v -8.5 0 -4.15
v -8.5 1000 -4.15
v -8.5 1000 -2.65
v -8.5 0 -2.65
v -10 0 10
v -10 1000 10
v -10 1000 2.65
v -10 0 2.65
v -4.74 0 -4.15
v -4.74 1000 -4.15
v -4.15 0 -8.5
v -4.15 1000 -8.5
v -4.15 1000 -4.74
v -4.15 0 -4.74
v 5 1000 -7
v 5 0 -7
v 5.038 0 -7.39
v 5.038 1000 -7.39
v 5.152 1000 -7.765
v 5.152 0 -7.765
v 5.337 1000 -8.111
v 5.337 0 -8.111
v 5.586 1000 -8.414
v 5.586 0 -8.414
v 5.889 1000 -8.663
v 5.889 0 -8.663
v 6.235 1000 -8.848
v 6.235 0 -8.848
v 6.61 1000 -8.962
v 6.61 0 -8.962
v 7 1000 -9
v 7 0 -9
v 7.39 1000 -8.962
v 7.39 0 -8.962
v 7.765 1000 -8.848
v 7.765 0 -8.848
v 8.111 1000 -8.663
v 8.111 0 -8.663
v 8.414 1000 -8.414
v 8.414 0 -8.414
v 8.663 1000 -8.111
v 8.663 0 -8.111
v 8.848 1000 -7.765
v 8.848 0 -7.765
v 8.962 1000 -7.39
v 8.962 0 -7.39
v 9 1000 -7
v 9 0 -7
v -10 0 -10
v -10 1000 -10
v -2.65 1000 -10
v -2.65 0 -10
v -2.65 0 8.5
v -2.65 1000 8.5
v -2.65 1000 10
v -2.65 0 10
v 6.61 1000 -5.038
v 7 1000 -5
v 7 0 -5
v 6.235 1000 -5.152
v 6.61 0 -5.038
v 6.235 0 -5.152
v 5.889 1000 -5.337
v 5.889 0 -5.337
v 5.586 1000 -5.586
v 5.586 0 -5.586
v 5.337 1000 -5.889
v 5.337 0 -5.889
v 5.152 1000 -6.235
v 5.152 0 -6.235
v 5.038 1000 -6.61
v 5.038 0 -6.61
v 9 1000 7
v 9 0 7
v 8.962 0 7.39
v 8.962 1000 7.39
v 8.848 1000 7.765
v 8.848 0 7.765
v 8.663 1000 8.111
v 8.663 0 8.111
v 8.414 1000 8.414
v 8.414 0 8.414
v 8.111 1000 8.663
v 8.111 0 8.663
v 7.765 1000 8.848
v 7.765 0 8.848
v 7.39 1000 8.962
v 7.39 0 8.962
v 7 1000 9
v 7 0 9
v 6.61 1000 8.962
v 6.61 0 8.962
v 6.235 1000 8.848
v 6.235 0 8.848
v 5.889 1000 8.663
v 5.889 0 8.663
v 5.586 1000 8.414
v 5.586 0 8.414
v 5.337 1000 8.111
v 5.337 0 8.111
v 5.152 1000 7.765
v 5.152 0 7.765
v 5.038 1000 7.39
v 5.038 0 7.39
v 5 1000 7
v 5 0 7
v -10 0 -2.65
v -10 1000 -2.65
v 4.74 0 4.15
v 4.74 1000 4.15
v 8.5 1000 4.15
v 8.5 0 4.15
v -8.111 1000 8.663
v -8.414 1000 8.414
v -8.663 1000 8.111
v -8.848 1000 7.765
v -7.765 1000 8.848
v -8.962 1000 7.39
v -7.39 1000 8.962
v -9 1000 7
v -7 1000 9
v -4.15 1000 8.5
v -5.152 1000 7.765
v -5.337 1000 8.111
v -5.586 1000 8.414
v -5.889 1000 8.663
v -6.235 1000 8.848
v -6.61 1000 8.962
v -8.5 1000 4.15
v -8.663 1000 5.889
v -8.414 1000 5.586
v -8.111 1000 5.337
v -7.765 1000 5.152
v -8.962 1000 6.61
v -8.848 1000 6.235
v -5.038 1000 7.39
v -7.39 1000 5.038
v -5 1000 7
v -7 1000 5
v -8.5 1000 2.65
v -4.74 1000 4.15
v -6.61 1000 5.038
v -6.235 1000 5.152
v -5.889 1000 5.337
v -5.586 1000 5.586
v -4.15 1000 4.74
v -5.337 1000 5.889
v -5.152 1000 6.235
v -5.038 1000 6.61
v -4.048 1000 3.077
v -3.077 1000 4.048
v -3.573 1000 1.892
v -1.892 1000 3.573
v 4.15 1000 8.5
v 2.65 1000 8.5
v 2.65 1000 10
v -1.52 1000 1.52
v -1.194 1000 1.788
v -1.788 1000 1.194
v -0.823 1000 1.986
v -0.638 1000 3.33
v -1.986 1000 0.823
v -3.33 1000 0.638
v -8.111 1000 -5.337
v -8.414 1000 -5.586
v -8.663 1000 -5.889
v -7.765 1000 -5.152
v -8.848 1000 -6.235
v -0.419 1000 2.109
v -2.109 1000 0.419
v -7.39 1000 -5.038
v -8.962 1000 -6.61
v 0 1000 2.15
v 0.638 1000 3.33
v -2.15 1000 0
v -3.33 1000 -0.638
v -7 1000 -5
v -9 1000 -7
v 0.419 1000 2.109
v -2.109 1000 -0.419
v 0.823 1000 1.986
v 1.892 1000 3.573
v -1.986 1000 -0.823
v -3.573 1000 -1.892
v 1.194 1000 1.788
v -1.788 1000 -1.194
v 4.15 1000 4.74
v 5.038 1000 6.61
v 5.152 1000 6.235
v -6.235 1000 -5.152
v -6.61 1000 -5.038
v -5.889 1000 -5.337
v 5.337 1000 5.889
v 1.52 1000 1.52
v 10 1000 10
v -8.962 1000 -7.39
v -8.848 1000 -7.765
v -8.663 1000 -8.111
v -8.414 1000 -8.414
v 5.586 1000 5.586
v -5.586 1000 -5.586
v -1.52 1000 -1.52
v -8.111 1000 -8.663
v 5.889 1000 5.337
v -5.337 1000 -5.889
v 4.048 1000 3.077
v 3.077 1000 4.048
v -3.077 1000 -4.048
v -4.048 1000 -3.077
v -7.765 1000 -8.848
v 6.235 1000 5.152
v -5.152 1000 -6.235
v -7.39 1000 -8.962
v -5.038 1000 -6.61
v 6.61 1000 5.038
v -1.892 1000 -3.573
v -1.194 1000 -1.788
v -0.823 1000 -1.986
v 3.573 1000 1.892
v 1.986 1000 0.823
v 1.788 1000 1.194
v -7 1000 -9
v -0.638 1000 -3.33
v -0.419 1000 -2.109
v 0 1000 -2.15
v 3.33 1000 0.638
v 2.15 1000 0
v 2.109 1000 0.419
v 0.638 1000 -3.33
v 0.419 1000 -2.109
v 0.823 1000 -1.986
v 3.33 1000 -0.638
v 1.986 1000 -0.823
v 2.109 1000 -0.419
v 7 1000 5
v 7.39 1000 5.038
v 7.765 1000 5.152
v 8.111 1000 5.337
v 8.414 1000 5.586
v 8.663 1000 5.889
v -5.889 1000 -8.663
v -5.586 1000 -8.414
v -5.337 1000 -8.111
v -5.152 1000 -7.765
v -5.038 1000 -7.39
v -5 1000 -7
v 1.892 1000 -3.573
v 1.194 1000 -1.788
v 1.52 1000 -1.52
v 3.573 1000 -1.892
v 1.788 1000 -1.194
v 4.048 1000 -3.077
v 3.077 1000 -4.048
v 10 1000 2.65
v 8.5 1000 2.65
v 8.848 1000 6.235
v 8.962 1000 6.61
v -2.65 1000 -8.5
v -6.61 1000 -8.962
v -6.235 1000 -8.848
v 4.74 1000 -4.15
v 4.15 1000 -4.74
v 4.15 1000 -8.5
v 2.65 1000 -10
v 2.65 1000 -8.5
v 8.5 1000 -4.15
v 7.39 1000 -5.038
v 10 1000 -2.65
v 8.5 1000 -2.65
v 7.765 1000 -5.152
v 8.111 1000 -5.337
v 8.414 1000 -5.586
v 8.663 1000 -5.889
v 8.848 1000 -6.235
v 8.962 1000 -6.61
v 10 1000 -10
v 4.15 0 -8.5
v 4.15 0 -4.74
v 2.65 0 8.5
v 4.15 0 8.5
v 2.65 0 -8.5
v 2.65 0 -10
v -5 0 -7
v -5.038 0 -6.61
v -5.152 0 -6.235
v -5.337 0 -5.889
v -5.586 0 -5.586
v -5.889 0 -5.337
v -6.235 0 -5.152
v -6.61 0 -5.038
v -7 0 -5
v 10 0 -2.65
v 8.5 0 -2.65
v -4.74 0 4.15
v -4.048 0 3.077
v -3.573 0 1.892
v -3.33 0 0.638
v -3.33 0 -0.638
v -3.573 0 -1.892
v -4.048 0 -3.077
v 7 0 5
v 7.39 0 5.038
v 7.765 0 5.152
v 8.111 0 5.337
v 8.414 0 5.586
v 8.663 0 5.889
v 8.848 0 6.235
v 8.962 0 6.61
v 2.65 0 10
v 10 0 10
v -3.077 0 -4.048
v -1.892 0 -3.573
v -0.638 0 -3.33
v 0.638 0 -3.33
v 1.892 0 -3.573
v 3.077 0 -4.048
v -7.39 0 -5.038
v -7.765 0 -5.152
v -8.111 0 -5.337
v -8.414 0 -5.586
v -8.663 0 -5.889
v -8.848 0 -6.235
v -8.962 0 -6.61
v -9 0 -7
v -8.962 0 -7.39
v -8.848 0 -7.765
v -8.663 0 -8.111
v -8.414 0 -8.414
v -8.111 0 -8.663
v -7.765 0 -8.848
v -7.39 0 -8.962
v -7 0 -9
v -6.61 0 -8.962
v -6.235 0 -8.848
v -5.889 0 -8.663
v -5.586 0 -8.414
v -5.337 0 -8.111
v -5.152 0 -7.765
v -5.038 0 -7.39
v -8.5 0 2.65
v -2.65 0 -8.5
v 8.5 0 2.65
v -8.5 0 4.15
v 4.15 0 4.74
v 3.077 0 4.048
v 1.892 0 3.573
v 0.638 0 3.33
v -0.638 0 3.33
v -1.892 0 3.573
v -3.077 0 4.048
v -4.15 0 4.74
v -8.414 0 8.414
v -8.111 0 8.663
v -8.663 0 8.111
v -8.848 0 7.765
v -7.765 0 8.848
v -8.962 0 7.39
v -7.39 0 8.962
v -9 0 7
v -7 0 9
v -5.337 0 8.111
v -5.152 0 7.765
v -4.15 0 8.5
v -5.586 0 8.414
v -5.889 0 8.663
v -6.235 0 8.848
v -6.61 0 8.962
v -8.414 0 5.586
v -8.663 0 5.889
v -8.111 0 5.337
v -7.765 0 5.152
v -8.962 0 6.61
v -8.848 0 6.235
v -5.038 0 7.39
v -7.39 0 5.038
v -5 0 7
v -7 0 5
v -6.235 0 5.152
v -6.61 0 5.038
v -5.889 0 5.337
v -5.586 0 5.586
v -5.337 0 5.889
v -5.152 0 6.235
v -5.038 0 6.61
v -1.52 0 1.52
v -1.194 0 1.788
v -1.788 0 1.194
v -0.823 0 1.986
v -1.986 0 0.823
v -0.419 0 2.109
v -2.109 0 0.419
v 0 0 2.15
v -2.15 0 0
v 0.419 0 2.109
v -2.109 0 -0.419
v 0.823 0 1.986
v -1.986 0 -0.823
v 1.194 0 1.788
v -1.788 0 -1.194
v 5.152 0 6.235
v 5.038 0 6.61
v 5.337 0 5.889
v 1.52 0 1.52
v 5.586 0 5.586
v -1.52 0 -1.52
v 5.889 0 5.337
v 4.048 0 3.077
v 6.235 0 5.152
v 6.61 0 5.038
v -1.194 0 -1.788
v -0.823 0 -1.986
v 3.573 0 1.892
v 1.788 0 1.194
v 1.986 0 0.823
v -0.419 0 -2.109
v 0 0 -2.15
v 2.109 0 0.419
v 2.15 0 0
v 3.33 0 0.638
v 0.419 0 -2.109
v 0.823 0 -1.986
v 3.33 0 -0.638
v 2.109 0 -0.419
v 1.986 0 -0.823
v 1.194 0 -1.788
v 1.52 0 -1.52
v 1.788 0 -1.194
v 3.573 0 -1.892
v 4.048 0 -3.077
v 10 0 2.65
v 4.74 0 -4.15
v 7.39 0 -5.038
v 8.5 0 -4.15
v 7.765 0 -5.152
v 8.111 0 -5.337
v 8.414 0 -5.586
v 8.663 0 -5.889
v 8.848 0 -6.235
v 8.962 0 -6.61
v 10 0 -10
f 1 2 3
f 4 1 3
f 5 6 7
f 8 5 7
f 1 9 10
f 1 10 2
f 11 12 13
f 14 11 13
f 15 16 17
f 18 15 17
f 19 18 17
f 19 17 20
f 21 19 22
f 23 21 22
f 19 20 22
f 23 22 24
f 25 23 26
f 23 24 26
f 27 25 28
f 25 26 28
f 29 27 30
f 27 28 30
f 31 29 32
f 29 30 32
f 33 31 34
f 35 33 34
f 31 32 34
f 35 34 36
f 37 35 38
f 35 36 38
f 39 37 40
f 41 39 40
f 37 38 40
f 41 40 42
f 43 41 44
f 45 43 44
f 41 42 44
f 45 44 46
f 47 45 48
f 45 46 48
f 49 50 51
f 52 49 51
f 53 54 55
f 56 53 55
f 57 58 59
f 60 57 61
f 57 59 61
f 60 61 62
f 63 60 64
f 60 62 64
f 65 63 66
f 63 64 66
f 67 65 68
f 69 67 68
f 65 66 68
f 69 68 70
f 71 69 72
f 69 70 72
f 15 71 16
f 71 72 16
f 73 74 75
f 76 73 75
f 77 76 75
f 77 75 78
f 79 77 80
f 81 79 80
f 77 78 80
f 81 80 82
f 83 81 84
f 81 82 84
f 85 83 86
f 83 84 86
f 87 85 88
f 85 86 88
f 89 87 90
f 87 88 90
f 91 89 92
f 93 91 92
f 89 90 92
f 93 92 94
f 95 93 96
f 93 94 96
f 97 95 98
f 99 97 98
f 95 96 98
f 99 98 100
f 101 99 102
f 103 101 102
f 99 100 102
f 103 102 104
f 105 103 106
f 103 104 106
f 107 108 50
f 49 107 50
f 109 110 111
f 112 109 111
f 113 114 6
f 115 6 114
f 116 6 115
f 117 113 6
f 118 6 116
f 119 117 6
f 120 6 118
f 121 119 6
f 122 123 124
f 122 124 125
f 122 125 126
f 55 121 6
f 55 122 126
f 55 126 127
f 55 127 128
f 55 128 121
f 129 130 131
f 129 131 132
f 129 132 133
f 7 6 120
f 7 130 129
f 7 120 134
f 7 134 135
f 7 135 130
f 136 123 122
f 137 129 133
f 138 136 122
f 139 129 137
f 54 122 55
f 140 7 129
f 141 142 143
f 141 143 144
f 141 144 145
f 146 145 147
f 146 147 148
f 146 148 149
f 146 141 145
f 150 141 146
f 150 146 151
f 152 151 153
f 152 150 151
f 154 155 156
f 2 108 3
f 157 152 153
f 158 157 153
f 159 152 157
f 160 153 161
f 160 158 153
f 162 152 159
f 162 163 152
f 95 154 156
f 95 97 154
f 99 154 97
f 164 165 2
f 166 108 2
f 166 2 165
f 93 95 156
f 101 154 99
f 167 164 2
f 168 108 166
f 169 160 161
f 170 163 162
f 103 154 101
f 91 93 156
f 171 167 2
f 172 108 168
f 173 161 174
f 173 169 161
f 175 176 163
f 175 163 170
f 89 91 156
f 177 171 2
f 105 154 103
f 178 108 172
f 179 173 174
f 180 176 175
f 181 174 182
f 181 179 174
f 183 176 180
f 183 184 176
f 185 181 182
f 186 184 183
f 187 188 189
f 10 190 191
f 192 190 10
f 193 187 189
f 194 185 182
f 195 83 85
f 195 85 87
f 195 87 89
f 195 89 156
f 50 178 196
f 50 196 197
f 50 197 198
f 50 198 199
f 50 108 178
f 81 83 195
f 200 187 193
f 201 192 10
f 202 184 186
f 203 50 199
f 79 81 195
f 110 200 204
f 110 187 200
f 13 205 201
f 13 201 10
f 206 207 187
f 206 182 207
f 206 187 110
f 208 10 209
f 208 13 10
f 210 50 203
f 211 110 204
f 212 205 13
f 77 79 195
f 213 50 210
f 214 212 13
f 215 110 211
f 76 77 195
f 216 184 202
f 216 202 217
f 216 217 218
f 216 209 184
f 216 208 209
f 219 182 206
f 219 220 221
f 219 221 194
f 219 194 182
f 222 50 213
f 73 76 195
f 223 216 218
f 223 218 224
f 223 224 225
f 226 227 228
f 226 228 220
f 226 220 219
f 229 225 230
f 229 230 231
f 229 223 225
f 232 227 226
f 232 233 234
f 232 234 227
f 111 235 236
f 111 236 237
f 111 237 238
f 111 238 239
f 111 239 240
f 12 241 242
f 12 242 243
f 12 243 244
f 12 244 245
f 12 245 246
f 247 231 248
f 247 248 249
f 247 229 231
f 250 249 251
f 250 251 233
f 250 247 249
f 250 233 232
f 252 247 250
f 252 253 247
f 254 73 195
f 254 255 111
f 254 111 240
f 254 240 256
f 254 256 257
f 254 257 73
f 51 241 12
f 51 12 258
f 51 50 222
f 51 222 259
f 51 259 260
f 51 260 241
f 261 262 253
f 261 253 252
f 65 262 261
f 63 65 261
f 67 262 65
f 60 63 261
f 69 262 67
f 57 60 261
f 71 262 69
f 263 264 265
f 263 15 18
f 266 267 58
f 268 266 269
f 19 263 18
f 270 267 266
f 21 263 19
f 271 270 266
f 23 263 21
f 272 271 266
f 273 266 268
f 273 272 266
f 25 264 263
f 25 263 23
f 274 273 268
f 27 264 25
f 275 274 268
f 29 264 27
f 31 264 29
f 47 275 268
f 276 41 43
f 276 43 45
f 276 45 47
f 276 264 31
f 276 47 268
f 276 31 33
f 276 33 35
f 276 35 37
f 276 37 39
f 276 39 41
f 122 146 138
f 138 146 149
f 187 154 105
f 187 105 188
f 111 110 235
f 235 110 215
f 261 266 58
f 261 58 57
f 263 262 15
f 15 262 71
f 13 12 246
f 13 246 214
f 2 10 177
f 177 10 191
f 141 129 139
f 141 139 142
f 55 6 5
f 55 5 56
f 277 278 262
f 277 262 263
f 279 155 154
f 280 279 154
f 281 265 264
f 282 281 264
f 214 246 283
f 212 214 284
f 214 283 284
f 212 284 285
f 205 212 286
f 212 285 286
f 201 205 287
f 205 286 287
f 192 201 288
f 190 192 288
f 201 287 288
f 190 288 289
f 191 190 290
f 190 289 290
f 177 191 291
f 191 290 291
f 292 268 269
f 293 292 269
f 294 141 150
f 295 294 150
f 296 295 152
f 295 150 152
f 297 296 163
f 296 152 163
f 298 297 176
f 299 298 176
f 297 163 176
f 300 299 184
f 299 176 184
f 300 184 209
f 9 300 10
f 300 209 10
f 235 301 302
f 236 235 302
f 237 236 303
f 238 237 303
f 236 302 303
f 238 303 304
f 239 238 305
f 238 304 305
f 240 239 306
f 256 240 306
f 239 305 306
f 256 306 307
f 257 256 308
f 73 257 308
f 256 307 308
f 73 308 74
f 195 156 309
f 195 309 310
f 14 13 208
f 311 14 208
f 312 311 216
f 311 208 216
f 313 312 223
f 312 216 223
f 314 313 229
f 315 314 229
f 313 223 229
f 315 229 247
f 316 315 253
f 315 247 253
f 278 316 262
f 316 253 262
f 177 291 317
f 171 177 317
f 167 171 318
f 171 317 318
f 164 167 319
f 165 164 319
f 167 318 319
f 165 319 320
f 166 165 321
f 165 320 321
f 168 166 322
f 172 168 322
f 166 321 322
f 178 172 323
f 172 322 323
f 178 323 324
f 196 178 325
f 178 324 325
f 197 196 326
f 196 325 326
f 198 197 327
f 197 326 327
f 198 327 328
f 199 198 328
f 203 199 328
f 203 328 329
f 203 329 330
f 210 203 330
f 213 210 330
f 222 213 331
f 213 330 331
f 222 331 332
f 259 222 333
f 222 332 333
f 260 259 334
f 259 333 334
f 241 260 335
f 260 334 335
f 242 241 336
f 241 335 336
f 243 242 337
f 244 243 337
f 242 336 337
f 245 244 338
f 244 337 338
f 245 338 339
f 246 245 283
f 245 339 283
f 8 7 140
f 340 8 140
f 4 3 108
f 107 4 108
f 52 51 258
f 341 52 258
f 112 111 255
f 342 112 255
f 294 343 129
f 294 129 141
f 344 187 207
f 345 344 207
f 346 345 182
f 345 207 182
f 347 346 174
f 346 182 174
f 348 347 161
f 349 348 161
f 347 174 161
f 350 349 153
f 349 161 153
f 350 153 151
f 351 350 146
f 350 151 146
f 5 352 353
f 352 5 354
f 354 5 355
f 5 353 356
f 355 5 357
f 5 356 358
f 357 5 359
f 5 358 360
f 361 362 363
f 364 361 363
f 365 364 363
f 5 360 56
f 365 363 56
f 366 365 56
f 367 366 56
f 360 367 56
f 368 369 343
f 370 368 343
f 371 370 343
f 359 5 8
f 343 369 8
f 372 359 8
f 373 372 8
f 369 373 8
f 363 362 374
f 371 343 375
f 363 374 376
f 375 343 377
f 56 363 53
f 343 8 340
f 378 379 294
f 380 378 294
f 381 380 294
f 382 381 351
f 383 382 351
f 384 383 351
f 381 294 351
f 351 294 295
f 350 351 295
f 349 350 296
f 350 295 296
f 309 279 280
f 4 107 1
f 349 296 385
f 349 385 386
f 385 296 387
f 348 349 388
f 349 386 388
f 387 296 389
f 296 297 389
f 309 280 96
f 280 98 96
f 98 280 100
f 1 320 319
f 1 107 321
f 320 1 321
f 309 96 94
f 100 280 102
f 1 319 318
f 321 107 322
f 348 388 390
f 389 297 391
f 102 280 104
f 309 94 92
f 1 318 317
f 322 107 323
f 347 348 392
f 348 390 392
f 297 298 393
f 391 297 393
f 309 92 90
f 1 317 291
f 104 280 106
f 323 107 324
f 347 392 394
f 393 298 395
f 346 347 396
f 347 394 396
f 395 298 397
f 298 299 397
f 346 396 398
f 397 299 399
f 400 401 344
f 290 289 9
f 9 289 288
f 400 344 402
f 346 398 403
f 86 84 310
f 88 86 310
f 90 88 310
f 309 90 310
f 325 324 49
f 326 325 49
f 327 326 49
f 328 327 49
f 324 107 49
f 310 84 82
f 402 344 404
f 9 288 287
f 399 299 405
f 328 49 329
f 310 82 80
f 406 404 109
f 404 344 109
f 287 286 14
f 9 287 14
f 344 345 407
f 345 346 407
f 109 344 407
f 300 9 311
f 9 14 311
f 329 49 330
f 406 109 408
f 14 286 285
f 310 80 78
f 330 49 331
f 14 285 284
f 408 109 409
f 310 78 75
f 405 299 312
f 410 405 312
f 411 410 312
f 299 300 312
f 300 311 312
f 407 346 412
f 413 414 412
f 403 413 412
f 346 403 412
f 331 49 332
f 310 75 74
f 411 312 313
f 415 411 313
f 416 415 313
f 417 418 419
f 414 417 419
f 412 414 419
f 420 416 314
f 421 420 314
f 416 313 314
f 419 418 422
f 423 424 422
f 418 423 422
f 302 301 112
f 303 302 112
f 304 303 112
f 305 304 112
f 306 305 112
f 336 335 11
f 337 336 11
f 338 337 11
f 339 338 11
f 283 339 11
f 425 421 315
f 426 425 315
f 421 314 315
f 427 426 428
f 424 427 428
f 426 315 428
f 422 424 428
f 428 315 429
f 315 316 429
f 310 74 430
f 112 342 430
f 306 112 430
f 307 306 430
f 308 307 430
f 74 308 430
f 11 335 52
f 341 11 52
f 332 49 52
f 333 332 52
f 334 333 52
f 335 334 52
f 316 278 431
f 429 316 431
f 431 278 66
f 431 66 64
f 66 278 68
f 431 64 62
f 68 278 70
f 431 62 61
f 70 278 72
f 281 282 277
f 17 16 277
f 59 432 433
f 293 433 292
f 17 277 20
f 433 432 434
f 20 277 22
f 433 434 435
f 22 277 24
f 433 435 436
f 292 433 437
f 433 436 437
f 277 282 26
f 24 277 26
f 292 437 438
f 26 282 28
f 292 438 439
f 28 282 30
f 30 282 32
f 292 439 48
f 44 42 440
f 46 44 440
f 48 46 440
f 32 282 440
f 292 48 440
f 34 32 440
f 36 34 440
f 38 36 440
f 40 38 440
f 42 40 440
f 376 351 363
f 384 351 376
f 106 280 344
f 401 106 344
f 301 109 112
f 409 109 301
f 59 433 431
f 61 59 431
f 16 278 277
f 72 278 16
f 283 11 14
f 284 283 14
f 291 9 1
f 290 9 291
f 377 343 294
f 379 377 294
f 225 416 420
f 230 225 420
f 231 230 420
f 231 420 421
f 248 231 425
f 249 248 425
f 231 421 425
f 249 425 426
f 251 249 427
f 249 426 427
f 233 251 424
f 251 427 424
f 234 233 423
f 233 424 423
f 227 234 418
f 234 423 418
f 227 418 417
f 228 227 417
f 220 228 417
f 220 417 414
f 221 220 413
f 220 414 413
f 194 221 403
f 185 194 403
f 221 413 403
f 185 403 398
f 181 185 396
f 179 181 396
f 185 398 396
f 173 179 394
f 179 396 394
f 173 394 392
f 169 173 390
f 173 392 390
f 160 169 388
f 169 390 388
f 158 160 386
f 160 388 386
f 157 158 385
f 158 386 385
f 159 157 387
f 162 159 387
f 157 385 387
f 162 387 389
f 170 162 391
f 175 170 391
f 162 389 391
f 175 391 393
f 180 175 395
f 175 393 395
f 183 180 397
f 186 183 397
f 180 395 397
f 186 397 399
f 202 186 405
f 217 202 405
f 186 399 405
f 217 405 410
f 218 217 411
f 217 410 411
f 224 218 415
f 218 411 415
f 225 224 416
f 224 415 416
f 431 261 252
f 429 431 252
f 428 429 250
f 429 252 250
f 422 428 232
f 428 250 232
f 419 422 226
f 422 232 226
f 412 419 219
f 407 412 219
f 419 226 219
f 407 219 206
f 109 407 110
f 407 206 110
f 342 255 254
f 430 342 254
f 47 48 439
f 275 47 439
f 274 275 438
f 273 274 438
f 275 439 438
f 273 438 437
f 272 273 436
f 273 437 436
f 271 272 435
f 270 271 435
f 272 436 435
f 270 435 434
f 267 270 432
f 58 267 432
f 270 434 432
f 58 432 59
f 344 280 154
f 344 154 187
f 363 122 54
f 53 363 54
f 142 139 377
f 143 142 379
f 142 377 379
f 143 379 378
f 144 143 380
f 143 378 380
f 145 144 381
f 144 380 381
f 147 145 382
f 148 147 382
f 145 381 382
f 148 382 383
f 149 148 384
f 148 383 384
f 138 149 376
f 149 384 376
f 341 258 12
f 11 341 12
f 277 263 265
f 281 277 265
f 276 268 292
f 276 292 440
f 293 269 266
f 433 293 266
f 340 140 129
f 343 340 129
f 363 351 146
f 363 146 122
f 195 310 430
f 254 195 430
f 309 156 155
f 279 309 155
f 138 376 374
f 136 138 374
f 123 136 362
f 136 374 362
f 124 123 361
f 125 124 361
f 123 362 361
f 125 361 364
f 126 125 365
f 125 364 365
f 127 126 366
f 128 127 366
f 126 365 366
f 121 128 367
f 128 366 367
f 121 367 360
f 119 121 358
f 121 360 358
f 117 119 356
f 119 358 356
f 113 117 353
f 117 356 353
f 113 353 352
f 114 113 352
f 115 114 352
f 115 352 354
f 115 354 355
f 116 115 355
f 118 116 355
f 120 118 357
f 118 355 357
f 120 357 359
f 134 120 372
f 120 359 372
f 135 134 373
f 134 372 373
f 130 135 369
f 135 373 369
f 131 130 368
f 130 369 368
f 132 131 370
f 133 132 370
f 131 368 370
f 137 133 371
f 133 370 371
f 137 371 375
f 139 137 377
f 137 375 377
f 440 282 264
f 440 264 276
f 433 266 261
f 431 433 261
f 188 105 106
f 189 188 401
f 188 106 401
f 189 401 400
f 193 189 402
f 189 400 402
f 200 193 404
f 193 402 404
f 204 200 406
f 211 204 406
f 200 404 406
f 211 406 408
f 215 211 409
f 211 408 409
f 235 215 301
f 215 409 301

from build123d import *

# Parameters (mm, degrees)
SKETCH_2_W               = 20
SKETCH_2_H               = 20
EXTRUDE_20201000_DEPTH   = 1000
CUT_EXTRUDE_1005_DEPTH   = 1001.099995
PATTERN_CIRCULAR_1_COUNT = 4
SKETCH_4_R               = 2.15
CUT_EXTRUDE_4_DEPTH      = 1000


with BuildPart() as part:
    # 스케치2 → 20201000 (new body)
    with BuildSketch(Plane(origin=(0, 0, 0), x_dir=(1, 0, 0), z_dir=(0, 1, 0))):
        Rectangle(SKETCH_2_W, SKETCH_2_H)
    extrude(amount=EXTRUDE_20201000_DEPTH)

    # 스케치1 → Cut-Extrude 1005 (cut, symmetric)
    with BuildSketch(Plane(origin=(0, 0, 0), x_dir=(1, 0, 0), z_dir=(0, 1, 0))):
        with BuildLine():
            Line((4.15, 7), (-4.15, 7))
            Line((-4.15, 7), (-4.15, 4.740009506))
            ThreePointArc((-4.15, 4.740009506), (0, 3.3), (4.15, 4.740009506))
            Line((4.15, 4.740009506), (4.15, 7))
        make_face()
        Polygon((2.65, 10), (-2.65, 10), (-2.65, 8.5), (-4.15, 8.5), (-4.15, 7), (4.15, 7), (4.15, 8.5), (2.65, 8.5), align=None)
    cut_extrude_1005 = extrude(amount=CUT_EXTRUDE_1005_DEPTH, both=True, mode=Mode.SUBTRACT)

    # 원형 패턴1: Cut-Extrude 1005 ×4 about axis
    pattern_circular_1_axis = Axis((0, 0, 0), (0, 1, 0))
    for i in range(1, PATTERN_CIRCULAR_1_COUNT):
        add(cut_extrude_1005.rotate(pattern_circular_1_axis, i * 360 / PATTERN_CIRCULAR_1_COUNT), mode=Mode.SUBTRACT)

    # 스케치4 → 컷-돌출4 (cut)
    with BuildSketch(Plane.XZ):
        with BuildLine():
            ThreePointArc((9, 7), (7, 9), (5, 7))
            Line((5, 7), (7, 7))
            Line((7, 7), (7, 5))
            ThreePointArc((7, 5), (8.414213562, 5.585786438), (9, 7))
        make_face()
        with BuildLine():
            Line((7, 7), (5, 7))
            ThreePointArc((5, 7), (5.585786438, 5.585786438), (7, 5))
            Line((7, 5), (7, 7))
        make_face()
        with Locations(Location((0, 0, 0), (0, 0, 270))):
            Circle(SKETCH_4_R)
        with BuildLine():
            ThreePointArc((9, -7), (8.414213562, -5.585786438), (7, -5))
            Line((7, -5), (7, -7))
            Line((7, -7), (5, -7))
            ThreePointArc((5, -7), (7, -9), (9, -7))
        make_face()
        with BuildLine():
            Line((7, -7), (7, -5))
            ThreePointArc((7, -5), (5.585786438, -5.585786438), (5, -7))
            Line((5, -7), (7, -7))
        make_face()
        with BuildLine():
            ThreePointArc((-5, -7), (-5.585786438, -5.585786438), (-7, -5))
            Line((-7, -5), (-7, -7))
            Line((-7, -7), (-5, -7))
        make_face()
        with BuildLine():
            Line((-7, -7), (-7, -5))
            ThreePointArc((-7, -5), (-8.414213562, -8.414213562), (-5, -7))
            Line((-5, -7), (-7, -7))
        make_face()
        with BuildLine():
            Line((-7, 5), (-7, 7))
            Line((-7, 7), (-5, 7))
            ThreePointArc((-5, 7), (-8.414213562, 8.414213562), (-7, 5))
        make_face()
        with BuildLine():
            Line((-5, 7), (-7, 7))
            Line((-7, 7), (-7, 5))
            ThreePointArc((-7, 5), (-5.585786438, 5.585786438), (-5, 7))
        make_face()
    extrude(amount=-CUT_EXTRUDE_4_DEPTH, mode=Mode.SUBTRACT)


solid = part.part
